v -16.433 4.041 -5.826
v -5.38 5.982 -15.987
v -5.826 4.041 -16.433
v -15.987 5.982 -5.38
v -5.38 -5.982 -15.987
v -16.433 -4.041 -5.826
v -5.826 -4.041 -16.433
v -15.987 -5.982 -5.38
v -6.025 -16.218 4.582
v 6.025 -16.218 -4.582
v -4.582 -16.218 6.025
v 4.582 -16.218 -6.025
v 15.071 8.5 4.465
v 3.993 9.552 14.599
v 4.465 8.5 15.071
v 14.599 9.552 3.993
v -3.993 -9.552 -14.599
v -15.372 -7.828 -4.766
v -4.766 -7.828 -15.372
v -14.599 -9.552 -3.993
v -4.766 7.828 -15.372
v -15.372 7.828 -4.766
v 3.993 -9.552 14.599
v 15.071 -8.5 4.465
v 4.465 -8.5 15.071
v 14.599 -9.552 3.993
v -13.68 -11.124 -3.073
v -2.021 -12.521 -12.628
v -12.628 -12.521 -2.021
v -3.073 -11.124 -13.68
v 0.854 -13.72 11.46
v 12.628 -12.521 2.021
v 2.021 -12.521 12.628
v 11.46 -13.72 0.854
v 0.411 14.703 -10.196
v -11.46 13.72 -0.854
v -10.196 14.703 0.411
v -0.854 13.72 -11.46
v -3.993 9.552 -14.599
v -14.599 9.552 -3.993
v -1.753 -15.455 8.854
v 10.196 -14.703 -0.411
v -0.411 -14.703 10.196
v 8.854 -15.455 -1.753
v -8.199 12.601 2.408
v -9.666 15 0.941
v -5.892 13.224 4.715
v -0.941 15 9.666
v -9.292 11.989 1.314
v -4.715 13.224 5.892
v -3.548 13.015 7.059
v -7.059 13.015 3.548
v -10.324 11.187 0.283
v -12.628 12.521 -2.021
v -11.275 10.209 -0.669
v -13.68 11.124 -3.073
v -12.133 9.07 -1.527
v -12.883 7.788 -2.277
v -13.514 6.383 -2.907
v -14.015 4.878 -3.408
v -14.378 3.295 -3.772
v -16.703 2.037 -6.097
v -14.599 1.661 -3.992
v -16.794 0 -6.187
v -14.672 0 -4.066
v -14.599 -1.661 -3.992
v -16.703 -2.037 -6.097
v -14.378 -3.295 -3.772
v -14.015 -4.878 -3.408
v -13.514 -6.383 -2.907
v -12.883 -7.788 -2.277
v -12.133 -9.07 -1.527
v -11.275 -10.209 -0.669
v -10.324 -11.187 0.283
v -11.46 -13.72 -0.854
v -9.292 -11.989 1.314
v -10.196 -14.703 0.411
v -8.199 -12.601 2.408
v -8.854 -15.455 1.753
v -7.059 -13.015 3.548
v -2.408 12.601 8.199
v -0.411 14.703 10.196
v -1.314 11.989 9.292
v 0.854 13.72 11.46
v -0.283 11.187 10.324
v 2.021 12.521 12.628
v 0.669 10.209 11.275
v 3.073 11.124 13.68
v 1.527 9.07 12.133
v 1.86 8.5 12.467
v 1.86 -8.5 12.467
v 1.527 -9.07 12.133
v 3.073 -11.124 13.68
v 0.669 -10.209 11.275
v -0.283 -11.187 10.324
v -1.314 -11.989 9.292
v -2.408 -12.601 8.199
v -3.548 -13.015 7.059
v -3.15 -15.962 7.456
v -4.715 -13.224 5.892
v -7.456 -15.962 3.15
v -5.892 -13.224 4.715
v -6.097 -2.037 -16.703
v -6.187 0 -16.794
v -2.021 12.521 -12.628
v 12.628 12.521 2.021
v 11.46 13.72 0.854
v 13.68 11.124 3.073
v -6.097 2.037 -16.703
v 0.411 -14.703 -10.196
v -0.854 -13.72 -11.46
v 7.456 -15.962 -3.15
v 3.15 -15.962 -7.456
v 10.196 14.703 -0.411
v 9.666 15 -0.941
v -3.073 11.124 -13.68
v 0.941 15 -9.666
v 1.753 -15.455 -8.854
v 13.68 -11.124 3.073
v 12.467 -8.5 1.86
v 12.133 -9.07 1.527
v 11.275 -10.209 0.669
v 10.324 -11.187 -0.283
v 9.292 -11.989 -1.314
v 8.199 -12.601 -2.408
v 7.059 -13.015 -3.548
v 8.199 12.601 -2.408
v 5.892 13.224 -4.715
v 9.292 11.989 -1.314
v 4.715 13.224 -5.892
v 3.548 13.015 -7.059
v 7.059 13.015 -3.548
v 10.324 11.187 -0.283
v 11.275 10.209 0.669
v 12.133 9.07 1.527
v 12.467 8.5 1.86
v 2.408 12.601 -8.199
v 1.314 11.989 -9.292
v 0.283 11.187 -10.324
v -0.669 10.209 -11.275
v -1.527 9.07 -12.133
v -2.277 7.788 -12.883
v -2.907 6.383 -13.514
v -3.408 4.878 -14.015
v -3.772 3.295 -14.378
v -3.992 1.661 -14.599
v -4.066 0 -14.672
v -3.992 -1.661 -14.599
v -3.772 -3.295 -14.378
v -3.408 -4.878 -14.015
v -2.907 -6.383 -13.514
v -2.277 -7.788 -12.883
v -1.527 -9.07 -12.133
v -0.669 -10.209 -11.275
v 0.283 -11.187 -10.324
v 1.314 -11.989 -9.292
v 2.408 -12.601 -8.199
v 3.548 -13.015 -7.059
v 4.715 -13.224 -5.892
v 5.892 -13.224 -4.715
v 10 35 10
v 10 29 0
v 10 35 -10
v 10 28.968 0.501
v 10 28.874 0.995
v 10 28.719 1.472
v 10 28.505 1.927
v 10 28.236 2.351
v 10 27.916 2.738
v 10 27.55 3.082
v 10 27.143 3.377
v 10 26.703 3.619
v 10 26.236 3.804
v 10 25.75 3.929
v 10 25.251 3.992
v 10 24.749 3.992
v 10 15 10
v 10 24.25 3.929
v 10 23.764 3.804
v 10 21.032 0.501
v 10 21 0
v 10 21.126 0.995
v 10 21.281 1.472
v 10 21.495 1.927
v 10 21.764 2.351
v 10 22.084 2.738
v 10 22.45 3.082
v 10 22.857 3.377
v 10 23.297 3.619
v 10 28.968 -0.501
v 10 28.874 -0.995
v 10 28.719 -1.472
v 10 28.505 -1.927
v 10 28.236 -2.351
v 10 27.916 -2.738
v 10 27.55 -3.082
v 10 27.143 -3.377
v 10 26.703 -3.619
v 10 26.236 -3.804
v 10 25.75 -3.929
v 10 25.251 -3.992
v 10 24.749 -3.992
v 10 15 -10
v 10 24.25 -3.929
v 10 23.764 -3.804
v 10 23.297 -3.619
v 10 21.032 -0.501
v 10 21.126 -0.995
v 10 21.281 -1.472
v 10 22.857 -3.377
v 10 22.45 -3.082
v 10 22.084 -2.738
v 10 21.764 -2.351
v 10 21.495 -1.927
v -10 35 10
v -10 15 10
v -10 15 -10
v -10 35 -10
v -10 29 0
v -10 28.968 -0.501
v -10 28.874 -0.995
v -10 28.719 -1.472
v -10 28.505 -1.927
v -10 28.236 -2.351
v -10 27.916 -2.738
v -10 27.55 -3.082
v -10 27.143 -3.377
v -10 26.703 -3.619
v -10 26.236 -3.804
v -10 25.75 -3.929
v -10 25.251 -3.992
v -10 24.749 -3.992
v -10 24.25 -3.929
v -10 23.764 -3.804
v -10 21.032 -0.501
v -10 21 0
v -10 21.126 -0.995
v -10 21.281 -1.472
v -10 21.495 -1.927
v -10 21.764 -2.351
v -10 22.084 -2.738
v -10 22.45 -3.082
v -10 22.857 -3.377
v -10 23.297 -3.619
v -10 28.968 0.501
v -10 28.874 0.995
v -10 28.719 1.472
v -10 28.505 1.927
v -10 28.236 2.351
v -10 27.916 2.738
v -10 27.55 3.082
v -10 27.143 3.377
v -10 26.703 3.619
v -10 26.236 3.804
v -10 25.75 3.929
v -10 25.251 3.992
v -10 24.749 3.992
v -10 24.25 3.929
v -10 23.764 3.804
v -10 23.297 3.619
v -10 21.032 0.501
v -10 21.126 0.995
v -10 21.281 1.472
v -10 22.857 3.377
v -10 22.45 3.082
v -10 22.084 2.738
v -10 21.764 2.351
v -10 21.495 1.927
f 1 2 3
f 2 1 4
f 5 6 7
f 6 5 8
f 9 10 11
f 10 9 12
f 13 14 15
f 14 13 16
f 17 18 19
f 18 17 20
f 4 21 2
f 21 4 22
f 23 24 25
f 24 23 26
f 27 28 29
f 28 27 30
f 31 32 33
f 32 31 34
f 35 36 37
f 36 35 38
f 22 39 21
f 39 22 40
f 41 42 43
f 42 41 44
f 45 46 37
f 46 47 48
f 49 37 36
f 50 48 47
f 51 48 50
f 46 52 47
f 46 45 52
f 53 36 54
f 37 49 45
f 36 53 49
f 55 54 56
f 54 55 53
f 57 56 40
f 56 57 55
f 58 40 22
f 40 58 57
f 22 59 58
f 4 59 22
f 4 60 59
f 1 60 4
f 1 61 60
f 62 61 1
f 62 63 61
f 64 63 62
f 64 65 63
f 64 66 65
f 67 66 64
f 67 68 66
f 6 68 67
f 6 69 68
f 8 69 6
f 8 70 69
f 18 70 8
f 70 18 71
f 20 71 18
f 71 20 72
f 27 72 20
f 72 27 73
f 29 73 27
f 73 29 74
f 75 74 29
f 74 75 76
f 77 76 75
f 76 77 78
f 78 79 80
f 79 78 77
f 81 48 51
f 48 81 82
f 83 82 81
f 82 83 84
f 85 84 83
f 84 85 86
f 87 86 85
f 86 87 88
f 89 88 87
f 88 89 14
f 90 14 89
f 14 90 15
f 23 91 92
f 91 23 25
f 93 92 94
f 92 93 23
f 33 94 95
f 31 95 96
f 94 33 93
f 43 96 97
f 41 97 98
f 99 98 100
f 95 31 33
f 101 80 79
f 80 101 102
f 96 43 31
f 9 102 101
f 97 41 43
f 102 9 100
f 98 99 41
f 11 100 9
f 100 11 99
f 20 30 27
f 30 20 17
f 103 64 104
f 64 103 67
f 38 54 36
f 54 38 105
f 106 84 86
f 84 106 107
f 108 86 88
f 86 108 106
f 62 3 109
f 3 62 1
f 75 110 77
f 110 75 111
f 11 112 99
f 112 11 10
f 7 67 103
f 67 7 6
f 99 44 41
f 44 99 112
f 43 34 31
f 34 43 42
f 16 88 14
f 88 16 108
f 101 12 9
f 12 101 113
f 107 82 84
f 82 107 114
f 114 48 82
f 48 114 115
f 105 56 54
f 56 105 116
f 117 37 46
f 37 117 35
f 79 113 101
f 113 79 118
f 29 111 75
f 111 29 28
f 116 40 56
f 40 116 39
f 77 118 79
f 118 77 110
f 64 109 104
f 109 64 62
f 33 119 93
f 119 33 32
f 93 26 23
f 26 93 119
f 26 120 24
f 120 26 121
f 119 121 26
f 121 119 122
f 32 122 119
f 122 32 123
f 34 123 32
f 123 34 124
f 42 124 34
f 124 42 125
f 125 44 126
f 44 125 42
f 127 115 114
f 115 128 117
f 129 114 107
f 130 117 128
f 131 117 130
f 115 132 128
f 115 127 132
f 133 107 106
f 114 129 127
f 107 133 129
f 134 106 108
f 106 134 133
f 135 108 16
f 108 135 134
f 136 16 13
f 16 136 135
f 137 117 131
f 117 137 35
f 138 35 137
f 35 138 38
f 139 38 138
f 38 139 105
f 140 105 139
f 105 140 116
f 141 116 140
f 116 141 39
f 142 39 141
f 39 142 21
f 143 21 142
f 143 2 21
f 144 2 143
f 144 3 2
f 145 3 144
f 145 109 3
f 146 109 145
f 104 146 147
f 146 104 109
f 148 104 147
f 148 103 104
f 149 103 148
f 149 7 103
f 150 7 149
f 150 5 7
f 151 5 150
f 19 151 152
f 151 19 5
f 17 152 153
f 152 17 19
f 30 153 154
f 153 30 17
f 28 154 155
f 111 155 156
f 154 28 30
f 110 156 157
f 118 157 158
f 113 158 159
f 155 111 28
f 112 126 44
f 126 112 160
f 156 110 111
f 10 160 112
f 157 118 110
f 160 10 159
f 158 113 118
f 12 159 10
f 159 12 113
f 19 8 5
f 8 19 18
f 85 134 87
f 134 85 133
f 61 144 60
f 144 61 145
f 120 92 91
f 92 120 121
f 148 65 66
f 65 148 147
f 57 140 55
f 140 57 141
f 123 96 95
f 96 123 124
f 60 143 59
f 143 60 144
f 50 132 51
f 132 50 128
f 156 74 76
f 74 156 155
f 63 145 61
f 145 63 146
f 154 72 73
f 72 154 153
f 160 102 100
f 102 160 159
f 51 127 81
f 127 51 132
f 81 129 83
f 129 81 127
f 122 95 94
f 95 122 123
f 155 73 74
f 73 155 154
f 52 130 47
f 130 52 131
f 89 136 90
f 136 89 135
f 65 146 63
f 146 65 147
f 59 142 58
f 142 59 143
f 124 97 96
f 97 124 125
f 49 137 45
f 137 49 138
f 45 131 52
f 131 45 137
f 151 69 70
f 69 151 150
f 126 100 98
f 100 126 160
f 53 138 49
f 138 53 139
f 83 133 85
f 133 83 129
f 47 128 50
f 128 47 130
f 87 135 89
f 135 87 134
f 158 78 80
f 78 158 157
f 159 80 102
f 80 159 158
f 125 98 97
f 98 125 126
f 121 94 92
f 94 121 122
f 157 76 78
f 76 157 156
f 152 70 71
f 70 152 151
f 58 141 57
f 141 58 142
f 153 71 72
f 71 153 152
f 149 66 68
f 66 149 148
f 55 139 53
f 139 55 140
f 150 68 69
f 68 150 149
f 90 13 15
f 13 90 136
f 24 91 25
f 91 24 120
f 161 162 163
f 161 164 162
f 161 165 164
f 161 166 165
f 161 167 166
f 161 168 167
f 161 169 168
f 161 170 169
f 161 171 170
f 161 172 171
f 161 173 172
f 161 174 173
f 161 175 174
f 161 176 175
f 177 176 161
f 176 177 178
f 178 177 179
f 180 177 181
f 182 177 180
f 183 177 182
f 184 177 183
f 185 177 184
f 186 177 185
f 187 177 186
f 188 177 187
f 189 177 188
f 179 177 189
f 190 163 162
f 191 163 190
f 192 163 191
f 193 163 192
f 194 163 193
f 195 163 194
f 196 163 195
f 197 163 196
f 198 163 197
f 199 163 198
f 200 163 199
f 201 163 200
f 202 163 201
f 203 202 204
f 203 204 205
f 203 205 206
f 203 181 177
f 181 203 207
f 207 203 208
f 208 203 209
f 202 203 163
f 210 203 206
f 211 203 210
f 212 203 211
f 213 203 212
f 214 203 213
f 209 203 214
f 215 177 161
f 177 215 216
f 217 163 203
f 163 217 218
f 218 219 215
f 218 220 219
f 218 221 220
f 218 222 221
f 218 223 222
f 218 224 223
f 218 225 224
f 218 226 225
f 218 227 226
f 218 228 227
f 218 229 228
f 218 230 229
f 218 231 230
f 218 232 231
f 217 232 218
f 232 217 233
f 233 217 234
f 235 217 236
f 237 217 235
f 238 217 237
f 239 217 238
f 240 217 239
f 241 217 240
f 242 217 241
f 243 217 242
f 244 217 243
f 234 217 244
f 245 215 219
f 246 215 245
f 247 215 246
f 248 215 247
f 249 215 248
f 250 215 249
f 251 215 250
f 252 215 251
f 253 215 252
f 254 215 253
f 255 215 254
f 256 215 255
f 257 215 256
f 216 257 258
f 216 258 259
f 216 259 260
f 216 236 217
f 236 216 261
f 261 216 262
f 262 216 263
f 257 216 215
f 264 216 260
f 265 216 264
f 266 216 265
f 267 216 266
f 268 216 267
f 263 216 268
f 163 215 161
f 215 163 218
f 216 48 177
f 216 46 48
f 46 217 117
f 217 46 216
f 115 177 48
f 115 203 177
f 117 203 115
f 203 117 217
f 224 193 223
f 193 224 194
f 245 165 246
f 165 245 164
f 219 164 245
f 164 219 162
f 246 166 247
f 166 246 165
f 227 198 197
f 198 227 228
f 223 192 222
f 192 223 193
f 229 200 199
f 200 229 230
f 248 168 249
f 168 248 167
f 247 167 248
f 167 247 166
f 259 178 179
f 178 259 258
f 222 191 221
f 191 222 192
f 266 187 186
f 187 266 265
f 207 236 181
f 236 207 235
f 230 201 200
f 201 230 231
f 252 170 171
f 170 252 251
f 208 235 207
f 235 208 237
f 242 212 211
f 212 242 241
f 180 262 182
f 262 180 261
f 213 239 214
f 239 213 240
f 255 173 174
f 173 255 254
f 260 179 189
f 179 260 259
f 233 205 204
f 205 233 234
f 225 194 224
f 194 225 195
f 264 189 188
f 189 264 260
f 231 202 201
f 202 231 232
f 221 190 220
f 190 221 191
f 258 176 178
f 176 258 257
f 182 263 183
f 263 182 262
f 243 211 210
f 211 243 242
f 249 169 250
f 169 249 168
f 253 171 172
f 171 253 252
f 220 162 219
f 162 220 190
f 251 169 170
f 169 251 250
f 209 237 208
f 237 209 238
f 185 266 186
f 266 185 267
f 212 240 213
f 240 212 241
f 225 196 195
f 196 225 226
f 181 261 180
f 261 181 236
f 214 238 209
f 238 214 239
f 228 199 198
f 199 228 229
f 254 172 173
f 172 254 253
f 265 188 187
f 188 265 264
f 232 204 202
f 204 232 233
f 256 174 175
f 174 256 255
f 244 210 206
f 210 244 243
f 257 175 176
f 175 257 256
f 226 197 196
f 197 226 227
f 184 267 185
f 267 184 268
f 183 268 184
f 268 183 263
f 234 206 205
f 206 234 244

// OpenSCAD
$fn = 50;
wall = 3;
torch_d = 26.5;

rotate([0,-45,0])
{
    difference()
    {
        cylinder(h=15, d=torch_d+wall+wall, center=true);
        cylinder(h=17, d=torch_d, center=true);
        translate([12,0,0]) cube(size=17, center=true);
    }
}

translate([0,25,0])
{
    difference()
    {
        cube(size=20, center=true);
        rotate([90,0,90]) cylinder(h=32, d=8, center=true);
    }
}
